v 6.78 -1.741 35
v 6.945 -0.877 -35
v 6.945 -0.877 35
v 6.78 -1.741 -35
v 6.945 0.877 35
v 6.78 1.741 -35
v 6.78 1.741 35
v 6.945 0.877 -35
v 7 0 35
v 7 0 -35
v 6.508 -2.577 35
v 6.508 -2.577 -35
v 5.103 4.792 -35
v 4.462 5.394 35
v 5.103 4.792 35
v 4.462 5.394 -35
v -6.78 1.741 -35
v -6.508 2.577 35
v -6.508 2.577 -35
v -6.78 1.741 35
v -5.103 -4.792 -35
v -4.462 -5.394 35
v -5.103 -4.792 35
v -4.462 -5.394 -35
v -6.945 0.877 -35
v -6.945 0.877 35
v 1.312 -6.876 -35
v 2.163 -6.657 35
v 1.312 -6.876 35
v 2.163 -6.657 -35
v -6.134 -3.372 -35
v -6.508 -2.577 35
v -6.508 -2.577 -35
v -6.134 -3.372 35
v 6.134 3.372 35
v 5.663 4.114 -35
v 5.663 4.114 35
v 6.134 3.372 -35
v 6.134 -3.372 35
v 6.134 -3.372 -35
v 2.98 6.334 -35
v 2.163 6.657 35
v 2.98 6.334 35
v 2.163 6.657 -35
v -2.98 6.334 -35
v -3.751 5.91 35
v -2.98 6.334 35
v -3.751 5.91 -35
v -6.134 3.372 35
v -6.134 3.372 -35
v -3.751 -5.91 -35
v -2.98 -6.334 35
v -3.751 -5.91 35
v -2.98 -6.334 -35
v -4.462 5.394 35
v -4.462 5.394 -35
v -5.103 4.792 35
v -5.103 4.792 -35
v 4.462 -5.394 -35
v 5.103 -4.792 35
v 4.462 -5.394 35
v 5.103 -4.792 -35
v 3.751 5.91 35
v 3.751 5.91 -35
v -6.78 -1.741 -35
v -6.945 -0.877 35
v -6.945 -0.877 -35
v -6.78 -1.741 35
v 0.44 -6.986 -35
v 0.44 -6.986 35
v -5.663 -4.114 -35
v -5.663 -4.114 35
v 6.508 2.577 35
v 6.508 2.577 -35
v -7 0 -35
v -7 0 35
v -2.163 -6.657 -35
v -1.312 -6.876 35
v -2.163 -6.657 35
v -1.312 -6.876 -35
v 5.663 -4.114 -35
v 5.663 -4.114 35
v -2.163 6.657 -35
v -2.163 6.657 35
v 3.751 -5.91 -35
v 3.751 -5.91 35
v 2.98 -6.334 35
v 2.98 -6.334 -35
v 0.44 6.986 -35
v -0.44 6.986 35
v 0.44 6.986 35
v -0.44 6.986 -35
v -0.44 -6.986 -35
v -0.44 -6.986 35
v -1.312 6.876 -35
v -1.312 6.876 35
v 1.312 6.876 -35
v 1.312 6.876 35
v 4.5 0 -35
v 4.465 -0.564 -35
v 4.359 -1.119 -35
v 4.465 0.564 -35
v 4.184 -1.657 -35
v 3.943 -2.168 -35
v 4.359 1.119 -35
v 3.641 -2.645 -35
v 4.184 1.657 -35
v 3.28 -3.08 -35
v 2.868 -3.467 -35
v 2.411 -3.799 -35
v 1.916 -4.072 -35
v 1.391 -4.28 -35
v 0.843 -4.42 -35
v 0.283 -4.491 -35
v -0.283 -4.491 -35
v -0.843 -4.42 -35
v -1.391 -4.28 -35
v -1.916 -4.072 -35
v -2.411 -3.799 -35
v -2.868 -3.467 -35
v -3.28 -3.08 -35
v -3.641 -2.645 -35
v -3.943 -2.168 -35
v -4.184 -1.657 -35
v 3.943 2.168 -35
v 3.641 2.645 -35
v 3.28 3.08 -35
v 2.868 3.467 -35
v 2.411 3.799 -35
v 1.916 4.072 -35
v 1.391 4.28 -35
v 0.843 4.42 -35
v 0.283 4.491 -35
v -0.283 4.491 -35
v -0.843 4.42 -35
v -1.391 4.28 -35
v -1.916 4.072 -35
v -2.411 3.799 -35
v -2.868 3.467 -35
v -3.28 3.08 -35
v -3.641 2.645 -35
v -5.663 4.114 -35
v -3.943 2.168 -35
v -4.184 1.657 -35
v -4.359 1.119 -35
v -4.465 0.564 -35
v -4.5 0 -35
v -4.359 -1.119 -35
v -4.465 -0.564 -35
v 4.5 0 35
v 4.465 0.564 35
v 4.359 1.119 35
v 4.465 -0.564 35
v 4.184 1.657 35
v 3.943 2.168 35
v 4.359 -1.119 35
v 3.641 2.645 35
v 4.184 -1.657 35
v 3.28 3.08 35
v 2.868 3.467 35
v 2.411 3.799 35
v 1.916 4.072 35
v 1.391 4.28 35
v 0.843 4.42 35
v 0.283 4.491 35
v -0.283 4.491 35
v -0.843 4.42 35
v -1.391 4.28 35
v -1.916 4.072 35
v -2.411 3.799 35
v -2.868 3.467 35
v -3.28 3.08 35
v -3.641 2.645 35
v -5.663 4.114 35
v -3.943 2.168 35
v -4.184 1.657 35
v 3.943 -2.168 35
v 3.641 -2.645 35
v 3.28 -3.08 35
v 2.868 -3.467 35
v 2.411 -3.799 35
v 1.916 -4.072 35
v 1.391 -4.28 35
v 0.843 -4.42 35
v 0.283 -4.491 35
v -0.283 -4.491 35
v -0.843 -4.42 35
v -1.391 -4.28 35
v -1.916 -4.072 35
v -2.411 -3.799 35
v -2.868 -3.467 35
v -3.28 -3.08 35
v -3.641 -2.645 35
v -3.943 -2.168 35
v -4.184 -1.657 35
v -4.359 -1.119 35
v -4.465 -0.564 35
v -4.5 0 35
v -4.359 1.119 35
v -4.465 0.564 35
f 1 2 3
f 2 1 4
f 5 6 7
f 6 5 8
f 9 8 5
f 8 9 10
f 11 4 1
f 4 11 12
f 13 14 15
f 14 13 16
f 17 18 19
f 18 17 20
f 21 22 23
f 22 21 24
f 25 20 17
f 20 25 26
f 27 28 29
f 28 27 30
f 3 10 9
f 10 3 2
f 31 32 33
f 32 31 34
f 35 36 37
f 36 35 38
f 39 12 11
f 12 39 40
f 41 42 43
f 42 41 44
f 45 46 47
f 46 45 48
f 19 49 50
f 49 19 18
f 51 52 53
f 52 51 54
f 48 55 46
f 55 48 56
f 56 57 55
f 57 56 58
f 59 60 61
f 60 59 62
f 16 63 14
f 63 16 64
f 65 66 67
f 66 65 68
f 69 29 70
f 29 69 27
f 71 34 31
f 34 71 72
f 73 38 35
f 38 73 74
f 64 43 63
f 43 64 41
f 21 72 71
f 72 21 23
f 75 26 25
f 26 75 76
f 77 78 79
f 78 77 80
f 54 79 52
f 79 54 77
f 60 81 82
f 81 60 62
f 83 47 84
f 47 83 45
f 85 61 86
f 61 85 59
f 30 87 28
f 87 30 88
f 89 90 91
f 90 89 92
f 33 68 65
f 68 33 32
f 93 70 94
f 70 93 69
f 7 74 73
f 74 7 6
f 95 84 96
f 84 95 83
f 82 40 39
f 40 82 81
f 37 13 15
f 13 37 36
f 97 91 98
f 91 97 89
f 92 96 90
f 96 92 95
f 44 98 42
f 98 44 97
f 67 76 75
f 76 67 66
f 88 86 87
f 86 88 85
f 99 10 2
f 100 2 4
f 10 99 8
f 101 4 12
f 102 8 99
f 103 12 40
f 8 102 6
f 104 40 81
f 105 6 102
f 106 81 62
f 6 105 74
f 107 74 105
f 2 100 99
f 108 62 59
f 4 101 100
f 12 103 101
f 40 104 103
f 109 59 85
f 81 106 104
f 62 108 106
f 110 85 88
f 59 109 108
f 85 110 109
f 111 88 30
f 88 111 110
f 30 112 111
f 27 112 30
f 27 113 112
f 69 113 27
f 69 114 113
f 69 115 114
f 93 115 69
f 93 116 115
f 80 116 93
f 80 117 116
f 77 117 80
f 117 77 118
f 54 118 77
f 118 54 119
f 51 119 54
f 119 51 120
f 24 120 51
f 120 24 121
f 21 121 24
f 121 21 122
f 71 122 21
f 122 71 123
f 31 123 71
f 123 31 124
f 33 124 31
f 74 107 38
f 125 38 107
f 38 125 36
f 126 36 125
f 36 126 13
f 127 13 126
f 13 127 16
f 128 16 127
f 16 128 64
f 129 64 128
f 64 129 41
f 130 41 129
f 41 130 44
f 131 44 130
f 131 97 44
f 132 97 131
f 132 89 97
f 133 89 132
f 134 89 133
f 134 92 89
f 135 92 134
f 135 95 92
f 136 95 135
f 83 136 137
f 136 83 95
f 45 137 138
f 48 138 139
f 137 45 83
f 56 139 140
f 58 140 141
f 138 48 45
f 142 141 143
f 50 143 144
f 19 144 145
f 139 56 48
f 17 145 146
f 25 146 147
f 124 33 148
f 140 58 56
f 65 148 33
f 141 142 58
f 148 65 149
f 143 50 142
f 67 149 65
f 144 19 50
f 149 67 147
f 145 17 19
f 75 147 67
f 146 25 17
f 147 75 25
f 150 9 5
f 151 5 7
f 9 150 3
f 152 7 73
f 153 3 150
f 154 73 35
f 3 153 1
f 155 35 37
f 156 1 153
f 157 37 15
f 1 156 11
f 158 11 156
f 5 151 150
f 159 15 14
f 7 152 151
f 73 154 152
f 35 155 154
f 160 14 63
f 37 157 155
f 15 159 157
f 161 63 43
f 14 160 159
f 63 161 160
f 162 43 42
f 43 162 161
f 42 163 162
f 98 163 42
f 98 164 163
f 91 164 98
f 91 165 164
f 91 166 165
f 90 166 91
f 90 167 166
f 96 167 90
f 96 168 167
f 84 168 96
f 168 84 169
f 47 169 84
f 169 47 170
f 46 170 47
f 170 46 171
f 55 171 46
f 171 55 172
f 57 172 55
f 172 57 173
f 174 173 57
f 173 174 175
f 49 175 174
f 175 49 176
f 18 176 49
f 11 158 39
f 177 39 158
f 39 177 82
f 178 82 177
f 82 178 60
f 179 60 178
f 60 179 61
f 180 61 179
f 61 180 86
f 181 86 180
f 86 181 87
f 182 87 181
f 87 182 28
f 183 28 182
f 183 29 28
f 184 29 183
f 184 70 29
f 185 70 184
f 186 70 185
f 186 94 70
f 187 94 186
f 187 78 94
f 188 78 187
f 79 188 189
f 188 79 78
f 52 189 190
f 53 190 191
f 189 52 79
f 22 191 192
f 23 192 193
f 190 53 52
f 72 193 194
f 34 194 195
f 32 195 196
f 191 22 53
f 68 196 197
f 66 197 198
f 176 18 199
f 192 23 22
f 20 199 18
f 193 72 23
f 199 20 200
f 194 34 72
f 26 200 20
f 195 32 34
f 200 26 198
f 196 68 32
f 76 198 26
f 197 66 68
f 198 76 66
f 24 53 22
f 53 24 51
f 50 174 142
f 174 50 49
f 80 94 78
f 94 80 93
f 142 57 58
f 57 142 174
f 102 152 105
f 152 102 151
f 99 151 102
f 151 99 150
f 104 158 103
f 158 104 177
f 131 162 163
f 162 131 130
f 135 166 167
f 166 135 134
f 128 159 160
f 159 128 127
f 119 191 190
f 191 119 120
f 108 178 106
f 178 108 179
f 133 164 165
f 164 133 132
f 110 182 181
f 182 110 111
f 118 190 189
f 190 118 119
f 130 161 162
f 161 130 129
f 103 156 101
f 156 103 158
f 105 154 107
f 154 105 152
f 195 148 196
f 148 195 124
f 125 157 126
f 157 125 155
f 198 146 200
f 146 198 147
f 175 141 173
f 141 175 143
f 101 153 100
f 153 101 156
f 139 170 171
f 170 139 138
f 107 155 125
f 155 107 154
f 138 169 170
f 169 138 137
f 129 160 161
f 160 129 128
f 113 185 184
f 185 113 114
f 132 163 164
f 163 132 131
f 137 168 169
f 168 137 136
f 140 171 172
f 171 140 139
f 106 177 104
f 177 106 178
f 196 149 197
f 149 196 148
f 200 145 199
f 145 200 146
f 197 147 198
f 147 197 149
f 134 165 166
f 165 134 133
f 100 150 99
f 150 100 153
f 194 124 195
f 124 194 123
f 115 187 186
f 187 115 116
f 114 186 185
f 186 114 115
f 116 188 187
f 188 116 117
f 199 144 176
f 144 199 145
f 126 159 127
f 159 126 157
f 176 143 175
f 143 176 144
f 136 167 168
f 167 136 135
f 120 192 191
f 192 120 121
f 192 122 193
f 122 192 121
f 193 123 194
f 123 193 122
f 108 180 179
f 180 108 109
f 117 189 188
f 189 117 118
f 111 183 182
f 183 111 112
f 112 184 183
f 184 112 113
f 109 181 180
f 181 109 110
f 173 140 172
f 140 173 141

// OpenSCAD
$fn = 50;


difference() {
	union() {
		translate(v = [0, 0, -35.0000000000]) {
			cylinder(h = 70, r = 7.0000000000);
		}
	}
	union() {
		translate(v = [0, 0, -100.0000000000]) {
			cylinder(h = 200, r = 4.5000000000);
		}
	}
}
